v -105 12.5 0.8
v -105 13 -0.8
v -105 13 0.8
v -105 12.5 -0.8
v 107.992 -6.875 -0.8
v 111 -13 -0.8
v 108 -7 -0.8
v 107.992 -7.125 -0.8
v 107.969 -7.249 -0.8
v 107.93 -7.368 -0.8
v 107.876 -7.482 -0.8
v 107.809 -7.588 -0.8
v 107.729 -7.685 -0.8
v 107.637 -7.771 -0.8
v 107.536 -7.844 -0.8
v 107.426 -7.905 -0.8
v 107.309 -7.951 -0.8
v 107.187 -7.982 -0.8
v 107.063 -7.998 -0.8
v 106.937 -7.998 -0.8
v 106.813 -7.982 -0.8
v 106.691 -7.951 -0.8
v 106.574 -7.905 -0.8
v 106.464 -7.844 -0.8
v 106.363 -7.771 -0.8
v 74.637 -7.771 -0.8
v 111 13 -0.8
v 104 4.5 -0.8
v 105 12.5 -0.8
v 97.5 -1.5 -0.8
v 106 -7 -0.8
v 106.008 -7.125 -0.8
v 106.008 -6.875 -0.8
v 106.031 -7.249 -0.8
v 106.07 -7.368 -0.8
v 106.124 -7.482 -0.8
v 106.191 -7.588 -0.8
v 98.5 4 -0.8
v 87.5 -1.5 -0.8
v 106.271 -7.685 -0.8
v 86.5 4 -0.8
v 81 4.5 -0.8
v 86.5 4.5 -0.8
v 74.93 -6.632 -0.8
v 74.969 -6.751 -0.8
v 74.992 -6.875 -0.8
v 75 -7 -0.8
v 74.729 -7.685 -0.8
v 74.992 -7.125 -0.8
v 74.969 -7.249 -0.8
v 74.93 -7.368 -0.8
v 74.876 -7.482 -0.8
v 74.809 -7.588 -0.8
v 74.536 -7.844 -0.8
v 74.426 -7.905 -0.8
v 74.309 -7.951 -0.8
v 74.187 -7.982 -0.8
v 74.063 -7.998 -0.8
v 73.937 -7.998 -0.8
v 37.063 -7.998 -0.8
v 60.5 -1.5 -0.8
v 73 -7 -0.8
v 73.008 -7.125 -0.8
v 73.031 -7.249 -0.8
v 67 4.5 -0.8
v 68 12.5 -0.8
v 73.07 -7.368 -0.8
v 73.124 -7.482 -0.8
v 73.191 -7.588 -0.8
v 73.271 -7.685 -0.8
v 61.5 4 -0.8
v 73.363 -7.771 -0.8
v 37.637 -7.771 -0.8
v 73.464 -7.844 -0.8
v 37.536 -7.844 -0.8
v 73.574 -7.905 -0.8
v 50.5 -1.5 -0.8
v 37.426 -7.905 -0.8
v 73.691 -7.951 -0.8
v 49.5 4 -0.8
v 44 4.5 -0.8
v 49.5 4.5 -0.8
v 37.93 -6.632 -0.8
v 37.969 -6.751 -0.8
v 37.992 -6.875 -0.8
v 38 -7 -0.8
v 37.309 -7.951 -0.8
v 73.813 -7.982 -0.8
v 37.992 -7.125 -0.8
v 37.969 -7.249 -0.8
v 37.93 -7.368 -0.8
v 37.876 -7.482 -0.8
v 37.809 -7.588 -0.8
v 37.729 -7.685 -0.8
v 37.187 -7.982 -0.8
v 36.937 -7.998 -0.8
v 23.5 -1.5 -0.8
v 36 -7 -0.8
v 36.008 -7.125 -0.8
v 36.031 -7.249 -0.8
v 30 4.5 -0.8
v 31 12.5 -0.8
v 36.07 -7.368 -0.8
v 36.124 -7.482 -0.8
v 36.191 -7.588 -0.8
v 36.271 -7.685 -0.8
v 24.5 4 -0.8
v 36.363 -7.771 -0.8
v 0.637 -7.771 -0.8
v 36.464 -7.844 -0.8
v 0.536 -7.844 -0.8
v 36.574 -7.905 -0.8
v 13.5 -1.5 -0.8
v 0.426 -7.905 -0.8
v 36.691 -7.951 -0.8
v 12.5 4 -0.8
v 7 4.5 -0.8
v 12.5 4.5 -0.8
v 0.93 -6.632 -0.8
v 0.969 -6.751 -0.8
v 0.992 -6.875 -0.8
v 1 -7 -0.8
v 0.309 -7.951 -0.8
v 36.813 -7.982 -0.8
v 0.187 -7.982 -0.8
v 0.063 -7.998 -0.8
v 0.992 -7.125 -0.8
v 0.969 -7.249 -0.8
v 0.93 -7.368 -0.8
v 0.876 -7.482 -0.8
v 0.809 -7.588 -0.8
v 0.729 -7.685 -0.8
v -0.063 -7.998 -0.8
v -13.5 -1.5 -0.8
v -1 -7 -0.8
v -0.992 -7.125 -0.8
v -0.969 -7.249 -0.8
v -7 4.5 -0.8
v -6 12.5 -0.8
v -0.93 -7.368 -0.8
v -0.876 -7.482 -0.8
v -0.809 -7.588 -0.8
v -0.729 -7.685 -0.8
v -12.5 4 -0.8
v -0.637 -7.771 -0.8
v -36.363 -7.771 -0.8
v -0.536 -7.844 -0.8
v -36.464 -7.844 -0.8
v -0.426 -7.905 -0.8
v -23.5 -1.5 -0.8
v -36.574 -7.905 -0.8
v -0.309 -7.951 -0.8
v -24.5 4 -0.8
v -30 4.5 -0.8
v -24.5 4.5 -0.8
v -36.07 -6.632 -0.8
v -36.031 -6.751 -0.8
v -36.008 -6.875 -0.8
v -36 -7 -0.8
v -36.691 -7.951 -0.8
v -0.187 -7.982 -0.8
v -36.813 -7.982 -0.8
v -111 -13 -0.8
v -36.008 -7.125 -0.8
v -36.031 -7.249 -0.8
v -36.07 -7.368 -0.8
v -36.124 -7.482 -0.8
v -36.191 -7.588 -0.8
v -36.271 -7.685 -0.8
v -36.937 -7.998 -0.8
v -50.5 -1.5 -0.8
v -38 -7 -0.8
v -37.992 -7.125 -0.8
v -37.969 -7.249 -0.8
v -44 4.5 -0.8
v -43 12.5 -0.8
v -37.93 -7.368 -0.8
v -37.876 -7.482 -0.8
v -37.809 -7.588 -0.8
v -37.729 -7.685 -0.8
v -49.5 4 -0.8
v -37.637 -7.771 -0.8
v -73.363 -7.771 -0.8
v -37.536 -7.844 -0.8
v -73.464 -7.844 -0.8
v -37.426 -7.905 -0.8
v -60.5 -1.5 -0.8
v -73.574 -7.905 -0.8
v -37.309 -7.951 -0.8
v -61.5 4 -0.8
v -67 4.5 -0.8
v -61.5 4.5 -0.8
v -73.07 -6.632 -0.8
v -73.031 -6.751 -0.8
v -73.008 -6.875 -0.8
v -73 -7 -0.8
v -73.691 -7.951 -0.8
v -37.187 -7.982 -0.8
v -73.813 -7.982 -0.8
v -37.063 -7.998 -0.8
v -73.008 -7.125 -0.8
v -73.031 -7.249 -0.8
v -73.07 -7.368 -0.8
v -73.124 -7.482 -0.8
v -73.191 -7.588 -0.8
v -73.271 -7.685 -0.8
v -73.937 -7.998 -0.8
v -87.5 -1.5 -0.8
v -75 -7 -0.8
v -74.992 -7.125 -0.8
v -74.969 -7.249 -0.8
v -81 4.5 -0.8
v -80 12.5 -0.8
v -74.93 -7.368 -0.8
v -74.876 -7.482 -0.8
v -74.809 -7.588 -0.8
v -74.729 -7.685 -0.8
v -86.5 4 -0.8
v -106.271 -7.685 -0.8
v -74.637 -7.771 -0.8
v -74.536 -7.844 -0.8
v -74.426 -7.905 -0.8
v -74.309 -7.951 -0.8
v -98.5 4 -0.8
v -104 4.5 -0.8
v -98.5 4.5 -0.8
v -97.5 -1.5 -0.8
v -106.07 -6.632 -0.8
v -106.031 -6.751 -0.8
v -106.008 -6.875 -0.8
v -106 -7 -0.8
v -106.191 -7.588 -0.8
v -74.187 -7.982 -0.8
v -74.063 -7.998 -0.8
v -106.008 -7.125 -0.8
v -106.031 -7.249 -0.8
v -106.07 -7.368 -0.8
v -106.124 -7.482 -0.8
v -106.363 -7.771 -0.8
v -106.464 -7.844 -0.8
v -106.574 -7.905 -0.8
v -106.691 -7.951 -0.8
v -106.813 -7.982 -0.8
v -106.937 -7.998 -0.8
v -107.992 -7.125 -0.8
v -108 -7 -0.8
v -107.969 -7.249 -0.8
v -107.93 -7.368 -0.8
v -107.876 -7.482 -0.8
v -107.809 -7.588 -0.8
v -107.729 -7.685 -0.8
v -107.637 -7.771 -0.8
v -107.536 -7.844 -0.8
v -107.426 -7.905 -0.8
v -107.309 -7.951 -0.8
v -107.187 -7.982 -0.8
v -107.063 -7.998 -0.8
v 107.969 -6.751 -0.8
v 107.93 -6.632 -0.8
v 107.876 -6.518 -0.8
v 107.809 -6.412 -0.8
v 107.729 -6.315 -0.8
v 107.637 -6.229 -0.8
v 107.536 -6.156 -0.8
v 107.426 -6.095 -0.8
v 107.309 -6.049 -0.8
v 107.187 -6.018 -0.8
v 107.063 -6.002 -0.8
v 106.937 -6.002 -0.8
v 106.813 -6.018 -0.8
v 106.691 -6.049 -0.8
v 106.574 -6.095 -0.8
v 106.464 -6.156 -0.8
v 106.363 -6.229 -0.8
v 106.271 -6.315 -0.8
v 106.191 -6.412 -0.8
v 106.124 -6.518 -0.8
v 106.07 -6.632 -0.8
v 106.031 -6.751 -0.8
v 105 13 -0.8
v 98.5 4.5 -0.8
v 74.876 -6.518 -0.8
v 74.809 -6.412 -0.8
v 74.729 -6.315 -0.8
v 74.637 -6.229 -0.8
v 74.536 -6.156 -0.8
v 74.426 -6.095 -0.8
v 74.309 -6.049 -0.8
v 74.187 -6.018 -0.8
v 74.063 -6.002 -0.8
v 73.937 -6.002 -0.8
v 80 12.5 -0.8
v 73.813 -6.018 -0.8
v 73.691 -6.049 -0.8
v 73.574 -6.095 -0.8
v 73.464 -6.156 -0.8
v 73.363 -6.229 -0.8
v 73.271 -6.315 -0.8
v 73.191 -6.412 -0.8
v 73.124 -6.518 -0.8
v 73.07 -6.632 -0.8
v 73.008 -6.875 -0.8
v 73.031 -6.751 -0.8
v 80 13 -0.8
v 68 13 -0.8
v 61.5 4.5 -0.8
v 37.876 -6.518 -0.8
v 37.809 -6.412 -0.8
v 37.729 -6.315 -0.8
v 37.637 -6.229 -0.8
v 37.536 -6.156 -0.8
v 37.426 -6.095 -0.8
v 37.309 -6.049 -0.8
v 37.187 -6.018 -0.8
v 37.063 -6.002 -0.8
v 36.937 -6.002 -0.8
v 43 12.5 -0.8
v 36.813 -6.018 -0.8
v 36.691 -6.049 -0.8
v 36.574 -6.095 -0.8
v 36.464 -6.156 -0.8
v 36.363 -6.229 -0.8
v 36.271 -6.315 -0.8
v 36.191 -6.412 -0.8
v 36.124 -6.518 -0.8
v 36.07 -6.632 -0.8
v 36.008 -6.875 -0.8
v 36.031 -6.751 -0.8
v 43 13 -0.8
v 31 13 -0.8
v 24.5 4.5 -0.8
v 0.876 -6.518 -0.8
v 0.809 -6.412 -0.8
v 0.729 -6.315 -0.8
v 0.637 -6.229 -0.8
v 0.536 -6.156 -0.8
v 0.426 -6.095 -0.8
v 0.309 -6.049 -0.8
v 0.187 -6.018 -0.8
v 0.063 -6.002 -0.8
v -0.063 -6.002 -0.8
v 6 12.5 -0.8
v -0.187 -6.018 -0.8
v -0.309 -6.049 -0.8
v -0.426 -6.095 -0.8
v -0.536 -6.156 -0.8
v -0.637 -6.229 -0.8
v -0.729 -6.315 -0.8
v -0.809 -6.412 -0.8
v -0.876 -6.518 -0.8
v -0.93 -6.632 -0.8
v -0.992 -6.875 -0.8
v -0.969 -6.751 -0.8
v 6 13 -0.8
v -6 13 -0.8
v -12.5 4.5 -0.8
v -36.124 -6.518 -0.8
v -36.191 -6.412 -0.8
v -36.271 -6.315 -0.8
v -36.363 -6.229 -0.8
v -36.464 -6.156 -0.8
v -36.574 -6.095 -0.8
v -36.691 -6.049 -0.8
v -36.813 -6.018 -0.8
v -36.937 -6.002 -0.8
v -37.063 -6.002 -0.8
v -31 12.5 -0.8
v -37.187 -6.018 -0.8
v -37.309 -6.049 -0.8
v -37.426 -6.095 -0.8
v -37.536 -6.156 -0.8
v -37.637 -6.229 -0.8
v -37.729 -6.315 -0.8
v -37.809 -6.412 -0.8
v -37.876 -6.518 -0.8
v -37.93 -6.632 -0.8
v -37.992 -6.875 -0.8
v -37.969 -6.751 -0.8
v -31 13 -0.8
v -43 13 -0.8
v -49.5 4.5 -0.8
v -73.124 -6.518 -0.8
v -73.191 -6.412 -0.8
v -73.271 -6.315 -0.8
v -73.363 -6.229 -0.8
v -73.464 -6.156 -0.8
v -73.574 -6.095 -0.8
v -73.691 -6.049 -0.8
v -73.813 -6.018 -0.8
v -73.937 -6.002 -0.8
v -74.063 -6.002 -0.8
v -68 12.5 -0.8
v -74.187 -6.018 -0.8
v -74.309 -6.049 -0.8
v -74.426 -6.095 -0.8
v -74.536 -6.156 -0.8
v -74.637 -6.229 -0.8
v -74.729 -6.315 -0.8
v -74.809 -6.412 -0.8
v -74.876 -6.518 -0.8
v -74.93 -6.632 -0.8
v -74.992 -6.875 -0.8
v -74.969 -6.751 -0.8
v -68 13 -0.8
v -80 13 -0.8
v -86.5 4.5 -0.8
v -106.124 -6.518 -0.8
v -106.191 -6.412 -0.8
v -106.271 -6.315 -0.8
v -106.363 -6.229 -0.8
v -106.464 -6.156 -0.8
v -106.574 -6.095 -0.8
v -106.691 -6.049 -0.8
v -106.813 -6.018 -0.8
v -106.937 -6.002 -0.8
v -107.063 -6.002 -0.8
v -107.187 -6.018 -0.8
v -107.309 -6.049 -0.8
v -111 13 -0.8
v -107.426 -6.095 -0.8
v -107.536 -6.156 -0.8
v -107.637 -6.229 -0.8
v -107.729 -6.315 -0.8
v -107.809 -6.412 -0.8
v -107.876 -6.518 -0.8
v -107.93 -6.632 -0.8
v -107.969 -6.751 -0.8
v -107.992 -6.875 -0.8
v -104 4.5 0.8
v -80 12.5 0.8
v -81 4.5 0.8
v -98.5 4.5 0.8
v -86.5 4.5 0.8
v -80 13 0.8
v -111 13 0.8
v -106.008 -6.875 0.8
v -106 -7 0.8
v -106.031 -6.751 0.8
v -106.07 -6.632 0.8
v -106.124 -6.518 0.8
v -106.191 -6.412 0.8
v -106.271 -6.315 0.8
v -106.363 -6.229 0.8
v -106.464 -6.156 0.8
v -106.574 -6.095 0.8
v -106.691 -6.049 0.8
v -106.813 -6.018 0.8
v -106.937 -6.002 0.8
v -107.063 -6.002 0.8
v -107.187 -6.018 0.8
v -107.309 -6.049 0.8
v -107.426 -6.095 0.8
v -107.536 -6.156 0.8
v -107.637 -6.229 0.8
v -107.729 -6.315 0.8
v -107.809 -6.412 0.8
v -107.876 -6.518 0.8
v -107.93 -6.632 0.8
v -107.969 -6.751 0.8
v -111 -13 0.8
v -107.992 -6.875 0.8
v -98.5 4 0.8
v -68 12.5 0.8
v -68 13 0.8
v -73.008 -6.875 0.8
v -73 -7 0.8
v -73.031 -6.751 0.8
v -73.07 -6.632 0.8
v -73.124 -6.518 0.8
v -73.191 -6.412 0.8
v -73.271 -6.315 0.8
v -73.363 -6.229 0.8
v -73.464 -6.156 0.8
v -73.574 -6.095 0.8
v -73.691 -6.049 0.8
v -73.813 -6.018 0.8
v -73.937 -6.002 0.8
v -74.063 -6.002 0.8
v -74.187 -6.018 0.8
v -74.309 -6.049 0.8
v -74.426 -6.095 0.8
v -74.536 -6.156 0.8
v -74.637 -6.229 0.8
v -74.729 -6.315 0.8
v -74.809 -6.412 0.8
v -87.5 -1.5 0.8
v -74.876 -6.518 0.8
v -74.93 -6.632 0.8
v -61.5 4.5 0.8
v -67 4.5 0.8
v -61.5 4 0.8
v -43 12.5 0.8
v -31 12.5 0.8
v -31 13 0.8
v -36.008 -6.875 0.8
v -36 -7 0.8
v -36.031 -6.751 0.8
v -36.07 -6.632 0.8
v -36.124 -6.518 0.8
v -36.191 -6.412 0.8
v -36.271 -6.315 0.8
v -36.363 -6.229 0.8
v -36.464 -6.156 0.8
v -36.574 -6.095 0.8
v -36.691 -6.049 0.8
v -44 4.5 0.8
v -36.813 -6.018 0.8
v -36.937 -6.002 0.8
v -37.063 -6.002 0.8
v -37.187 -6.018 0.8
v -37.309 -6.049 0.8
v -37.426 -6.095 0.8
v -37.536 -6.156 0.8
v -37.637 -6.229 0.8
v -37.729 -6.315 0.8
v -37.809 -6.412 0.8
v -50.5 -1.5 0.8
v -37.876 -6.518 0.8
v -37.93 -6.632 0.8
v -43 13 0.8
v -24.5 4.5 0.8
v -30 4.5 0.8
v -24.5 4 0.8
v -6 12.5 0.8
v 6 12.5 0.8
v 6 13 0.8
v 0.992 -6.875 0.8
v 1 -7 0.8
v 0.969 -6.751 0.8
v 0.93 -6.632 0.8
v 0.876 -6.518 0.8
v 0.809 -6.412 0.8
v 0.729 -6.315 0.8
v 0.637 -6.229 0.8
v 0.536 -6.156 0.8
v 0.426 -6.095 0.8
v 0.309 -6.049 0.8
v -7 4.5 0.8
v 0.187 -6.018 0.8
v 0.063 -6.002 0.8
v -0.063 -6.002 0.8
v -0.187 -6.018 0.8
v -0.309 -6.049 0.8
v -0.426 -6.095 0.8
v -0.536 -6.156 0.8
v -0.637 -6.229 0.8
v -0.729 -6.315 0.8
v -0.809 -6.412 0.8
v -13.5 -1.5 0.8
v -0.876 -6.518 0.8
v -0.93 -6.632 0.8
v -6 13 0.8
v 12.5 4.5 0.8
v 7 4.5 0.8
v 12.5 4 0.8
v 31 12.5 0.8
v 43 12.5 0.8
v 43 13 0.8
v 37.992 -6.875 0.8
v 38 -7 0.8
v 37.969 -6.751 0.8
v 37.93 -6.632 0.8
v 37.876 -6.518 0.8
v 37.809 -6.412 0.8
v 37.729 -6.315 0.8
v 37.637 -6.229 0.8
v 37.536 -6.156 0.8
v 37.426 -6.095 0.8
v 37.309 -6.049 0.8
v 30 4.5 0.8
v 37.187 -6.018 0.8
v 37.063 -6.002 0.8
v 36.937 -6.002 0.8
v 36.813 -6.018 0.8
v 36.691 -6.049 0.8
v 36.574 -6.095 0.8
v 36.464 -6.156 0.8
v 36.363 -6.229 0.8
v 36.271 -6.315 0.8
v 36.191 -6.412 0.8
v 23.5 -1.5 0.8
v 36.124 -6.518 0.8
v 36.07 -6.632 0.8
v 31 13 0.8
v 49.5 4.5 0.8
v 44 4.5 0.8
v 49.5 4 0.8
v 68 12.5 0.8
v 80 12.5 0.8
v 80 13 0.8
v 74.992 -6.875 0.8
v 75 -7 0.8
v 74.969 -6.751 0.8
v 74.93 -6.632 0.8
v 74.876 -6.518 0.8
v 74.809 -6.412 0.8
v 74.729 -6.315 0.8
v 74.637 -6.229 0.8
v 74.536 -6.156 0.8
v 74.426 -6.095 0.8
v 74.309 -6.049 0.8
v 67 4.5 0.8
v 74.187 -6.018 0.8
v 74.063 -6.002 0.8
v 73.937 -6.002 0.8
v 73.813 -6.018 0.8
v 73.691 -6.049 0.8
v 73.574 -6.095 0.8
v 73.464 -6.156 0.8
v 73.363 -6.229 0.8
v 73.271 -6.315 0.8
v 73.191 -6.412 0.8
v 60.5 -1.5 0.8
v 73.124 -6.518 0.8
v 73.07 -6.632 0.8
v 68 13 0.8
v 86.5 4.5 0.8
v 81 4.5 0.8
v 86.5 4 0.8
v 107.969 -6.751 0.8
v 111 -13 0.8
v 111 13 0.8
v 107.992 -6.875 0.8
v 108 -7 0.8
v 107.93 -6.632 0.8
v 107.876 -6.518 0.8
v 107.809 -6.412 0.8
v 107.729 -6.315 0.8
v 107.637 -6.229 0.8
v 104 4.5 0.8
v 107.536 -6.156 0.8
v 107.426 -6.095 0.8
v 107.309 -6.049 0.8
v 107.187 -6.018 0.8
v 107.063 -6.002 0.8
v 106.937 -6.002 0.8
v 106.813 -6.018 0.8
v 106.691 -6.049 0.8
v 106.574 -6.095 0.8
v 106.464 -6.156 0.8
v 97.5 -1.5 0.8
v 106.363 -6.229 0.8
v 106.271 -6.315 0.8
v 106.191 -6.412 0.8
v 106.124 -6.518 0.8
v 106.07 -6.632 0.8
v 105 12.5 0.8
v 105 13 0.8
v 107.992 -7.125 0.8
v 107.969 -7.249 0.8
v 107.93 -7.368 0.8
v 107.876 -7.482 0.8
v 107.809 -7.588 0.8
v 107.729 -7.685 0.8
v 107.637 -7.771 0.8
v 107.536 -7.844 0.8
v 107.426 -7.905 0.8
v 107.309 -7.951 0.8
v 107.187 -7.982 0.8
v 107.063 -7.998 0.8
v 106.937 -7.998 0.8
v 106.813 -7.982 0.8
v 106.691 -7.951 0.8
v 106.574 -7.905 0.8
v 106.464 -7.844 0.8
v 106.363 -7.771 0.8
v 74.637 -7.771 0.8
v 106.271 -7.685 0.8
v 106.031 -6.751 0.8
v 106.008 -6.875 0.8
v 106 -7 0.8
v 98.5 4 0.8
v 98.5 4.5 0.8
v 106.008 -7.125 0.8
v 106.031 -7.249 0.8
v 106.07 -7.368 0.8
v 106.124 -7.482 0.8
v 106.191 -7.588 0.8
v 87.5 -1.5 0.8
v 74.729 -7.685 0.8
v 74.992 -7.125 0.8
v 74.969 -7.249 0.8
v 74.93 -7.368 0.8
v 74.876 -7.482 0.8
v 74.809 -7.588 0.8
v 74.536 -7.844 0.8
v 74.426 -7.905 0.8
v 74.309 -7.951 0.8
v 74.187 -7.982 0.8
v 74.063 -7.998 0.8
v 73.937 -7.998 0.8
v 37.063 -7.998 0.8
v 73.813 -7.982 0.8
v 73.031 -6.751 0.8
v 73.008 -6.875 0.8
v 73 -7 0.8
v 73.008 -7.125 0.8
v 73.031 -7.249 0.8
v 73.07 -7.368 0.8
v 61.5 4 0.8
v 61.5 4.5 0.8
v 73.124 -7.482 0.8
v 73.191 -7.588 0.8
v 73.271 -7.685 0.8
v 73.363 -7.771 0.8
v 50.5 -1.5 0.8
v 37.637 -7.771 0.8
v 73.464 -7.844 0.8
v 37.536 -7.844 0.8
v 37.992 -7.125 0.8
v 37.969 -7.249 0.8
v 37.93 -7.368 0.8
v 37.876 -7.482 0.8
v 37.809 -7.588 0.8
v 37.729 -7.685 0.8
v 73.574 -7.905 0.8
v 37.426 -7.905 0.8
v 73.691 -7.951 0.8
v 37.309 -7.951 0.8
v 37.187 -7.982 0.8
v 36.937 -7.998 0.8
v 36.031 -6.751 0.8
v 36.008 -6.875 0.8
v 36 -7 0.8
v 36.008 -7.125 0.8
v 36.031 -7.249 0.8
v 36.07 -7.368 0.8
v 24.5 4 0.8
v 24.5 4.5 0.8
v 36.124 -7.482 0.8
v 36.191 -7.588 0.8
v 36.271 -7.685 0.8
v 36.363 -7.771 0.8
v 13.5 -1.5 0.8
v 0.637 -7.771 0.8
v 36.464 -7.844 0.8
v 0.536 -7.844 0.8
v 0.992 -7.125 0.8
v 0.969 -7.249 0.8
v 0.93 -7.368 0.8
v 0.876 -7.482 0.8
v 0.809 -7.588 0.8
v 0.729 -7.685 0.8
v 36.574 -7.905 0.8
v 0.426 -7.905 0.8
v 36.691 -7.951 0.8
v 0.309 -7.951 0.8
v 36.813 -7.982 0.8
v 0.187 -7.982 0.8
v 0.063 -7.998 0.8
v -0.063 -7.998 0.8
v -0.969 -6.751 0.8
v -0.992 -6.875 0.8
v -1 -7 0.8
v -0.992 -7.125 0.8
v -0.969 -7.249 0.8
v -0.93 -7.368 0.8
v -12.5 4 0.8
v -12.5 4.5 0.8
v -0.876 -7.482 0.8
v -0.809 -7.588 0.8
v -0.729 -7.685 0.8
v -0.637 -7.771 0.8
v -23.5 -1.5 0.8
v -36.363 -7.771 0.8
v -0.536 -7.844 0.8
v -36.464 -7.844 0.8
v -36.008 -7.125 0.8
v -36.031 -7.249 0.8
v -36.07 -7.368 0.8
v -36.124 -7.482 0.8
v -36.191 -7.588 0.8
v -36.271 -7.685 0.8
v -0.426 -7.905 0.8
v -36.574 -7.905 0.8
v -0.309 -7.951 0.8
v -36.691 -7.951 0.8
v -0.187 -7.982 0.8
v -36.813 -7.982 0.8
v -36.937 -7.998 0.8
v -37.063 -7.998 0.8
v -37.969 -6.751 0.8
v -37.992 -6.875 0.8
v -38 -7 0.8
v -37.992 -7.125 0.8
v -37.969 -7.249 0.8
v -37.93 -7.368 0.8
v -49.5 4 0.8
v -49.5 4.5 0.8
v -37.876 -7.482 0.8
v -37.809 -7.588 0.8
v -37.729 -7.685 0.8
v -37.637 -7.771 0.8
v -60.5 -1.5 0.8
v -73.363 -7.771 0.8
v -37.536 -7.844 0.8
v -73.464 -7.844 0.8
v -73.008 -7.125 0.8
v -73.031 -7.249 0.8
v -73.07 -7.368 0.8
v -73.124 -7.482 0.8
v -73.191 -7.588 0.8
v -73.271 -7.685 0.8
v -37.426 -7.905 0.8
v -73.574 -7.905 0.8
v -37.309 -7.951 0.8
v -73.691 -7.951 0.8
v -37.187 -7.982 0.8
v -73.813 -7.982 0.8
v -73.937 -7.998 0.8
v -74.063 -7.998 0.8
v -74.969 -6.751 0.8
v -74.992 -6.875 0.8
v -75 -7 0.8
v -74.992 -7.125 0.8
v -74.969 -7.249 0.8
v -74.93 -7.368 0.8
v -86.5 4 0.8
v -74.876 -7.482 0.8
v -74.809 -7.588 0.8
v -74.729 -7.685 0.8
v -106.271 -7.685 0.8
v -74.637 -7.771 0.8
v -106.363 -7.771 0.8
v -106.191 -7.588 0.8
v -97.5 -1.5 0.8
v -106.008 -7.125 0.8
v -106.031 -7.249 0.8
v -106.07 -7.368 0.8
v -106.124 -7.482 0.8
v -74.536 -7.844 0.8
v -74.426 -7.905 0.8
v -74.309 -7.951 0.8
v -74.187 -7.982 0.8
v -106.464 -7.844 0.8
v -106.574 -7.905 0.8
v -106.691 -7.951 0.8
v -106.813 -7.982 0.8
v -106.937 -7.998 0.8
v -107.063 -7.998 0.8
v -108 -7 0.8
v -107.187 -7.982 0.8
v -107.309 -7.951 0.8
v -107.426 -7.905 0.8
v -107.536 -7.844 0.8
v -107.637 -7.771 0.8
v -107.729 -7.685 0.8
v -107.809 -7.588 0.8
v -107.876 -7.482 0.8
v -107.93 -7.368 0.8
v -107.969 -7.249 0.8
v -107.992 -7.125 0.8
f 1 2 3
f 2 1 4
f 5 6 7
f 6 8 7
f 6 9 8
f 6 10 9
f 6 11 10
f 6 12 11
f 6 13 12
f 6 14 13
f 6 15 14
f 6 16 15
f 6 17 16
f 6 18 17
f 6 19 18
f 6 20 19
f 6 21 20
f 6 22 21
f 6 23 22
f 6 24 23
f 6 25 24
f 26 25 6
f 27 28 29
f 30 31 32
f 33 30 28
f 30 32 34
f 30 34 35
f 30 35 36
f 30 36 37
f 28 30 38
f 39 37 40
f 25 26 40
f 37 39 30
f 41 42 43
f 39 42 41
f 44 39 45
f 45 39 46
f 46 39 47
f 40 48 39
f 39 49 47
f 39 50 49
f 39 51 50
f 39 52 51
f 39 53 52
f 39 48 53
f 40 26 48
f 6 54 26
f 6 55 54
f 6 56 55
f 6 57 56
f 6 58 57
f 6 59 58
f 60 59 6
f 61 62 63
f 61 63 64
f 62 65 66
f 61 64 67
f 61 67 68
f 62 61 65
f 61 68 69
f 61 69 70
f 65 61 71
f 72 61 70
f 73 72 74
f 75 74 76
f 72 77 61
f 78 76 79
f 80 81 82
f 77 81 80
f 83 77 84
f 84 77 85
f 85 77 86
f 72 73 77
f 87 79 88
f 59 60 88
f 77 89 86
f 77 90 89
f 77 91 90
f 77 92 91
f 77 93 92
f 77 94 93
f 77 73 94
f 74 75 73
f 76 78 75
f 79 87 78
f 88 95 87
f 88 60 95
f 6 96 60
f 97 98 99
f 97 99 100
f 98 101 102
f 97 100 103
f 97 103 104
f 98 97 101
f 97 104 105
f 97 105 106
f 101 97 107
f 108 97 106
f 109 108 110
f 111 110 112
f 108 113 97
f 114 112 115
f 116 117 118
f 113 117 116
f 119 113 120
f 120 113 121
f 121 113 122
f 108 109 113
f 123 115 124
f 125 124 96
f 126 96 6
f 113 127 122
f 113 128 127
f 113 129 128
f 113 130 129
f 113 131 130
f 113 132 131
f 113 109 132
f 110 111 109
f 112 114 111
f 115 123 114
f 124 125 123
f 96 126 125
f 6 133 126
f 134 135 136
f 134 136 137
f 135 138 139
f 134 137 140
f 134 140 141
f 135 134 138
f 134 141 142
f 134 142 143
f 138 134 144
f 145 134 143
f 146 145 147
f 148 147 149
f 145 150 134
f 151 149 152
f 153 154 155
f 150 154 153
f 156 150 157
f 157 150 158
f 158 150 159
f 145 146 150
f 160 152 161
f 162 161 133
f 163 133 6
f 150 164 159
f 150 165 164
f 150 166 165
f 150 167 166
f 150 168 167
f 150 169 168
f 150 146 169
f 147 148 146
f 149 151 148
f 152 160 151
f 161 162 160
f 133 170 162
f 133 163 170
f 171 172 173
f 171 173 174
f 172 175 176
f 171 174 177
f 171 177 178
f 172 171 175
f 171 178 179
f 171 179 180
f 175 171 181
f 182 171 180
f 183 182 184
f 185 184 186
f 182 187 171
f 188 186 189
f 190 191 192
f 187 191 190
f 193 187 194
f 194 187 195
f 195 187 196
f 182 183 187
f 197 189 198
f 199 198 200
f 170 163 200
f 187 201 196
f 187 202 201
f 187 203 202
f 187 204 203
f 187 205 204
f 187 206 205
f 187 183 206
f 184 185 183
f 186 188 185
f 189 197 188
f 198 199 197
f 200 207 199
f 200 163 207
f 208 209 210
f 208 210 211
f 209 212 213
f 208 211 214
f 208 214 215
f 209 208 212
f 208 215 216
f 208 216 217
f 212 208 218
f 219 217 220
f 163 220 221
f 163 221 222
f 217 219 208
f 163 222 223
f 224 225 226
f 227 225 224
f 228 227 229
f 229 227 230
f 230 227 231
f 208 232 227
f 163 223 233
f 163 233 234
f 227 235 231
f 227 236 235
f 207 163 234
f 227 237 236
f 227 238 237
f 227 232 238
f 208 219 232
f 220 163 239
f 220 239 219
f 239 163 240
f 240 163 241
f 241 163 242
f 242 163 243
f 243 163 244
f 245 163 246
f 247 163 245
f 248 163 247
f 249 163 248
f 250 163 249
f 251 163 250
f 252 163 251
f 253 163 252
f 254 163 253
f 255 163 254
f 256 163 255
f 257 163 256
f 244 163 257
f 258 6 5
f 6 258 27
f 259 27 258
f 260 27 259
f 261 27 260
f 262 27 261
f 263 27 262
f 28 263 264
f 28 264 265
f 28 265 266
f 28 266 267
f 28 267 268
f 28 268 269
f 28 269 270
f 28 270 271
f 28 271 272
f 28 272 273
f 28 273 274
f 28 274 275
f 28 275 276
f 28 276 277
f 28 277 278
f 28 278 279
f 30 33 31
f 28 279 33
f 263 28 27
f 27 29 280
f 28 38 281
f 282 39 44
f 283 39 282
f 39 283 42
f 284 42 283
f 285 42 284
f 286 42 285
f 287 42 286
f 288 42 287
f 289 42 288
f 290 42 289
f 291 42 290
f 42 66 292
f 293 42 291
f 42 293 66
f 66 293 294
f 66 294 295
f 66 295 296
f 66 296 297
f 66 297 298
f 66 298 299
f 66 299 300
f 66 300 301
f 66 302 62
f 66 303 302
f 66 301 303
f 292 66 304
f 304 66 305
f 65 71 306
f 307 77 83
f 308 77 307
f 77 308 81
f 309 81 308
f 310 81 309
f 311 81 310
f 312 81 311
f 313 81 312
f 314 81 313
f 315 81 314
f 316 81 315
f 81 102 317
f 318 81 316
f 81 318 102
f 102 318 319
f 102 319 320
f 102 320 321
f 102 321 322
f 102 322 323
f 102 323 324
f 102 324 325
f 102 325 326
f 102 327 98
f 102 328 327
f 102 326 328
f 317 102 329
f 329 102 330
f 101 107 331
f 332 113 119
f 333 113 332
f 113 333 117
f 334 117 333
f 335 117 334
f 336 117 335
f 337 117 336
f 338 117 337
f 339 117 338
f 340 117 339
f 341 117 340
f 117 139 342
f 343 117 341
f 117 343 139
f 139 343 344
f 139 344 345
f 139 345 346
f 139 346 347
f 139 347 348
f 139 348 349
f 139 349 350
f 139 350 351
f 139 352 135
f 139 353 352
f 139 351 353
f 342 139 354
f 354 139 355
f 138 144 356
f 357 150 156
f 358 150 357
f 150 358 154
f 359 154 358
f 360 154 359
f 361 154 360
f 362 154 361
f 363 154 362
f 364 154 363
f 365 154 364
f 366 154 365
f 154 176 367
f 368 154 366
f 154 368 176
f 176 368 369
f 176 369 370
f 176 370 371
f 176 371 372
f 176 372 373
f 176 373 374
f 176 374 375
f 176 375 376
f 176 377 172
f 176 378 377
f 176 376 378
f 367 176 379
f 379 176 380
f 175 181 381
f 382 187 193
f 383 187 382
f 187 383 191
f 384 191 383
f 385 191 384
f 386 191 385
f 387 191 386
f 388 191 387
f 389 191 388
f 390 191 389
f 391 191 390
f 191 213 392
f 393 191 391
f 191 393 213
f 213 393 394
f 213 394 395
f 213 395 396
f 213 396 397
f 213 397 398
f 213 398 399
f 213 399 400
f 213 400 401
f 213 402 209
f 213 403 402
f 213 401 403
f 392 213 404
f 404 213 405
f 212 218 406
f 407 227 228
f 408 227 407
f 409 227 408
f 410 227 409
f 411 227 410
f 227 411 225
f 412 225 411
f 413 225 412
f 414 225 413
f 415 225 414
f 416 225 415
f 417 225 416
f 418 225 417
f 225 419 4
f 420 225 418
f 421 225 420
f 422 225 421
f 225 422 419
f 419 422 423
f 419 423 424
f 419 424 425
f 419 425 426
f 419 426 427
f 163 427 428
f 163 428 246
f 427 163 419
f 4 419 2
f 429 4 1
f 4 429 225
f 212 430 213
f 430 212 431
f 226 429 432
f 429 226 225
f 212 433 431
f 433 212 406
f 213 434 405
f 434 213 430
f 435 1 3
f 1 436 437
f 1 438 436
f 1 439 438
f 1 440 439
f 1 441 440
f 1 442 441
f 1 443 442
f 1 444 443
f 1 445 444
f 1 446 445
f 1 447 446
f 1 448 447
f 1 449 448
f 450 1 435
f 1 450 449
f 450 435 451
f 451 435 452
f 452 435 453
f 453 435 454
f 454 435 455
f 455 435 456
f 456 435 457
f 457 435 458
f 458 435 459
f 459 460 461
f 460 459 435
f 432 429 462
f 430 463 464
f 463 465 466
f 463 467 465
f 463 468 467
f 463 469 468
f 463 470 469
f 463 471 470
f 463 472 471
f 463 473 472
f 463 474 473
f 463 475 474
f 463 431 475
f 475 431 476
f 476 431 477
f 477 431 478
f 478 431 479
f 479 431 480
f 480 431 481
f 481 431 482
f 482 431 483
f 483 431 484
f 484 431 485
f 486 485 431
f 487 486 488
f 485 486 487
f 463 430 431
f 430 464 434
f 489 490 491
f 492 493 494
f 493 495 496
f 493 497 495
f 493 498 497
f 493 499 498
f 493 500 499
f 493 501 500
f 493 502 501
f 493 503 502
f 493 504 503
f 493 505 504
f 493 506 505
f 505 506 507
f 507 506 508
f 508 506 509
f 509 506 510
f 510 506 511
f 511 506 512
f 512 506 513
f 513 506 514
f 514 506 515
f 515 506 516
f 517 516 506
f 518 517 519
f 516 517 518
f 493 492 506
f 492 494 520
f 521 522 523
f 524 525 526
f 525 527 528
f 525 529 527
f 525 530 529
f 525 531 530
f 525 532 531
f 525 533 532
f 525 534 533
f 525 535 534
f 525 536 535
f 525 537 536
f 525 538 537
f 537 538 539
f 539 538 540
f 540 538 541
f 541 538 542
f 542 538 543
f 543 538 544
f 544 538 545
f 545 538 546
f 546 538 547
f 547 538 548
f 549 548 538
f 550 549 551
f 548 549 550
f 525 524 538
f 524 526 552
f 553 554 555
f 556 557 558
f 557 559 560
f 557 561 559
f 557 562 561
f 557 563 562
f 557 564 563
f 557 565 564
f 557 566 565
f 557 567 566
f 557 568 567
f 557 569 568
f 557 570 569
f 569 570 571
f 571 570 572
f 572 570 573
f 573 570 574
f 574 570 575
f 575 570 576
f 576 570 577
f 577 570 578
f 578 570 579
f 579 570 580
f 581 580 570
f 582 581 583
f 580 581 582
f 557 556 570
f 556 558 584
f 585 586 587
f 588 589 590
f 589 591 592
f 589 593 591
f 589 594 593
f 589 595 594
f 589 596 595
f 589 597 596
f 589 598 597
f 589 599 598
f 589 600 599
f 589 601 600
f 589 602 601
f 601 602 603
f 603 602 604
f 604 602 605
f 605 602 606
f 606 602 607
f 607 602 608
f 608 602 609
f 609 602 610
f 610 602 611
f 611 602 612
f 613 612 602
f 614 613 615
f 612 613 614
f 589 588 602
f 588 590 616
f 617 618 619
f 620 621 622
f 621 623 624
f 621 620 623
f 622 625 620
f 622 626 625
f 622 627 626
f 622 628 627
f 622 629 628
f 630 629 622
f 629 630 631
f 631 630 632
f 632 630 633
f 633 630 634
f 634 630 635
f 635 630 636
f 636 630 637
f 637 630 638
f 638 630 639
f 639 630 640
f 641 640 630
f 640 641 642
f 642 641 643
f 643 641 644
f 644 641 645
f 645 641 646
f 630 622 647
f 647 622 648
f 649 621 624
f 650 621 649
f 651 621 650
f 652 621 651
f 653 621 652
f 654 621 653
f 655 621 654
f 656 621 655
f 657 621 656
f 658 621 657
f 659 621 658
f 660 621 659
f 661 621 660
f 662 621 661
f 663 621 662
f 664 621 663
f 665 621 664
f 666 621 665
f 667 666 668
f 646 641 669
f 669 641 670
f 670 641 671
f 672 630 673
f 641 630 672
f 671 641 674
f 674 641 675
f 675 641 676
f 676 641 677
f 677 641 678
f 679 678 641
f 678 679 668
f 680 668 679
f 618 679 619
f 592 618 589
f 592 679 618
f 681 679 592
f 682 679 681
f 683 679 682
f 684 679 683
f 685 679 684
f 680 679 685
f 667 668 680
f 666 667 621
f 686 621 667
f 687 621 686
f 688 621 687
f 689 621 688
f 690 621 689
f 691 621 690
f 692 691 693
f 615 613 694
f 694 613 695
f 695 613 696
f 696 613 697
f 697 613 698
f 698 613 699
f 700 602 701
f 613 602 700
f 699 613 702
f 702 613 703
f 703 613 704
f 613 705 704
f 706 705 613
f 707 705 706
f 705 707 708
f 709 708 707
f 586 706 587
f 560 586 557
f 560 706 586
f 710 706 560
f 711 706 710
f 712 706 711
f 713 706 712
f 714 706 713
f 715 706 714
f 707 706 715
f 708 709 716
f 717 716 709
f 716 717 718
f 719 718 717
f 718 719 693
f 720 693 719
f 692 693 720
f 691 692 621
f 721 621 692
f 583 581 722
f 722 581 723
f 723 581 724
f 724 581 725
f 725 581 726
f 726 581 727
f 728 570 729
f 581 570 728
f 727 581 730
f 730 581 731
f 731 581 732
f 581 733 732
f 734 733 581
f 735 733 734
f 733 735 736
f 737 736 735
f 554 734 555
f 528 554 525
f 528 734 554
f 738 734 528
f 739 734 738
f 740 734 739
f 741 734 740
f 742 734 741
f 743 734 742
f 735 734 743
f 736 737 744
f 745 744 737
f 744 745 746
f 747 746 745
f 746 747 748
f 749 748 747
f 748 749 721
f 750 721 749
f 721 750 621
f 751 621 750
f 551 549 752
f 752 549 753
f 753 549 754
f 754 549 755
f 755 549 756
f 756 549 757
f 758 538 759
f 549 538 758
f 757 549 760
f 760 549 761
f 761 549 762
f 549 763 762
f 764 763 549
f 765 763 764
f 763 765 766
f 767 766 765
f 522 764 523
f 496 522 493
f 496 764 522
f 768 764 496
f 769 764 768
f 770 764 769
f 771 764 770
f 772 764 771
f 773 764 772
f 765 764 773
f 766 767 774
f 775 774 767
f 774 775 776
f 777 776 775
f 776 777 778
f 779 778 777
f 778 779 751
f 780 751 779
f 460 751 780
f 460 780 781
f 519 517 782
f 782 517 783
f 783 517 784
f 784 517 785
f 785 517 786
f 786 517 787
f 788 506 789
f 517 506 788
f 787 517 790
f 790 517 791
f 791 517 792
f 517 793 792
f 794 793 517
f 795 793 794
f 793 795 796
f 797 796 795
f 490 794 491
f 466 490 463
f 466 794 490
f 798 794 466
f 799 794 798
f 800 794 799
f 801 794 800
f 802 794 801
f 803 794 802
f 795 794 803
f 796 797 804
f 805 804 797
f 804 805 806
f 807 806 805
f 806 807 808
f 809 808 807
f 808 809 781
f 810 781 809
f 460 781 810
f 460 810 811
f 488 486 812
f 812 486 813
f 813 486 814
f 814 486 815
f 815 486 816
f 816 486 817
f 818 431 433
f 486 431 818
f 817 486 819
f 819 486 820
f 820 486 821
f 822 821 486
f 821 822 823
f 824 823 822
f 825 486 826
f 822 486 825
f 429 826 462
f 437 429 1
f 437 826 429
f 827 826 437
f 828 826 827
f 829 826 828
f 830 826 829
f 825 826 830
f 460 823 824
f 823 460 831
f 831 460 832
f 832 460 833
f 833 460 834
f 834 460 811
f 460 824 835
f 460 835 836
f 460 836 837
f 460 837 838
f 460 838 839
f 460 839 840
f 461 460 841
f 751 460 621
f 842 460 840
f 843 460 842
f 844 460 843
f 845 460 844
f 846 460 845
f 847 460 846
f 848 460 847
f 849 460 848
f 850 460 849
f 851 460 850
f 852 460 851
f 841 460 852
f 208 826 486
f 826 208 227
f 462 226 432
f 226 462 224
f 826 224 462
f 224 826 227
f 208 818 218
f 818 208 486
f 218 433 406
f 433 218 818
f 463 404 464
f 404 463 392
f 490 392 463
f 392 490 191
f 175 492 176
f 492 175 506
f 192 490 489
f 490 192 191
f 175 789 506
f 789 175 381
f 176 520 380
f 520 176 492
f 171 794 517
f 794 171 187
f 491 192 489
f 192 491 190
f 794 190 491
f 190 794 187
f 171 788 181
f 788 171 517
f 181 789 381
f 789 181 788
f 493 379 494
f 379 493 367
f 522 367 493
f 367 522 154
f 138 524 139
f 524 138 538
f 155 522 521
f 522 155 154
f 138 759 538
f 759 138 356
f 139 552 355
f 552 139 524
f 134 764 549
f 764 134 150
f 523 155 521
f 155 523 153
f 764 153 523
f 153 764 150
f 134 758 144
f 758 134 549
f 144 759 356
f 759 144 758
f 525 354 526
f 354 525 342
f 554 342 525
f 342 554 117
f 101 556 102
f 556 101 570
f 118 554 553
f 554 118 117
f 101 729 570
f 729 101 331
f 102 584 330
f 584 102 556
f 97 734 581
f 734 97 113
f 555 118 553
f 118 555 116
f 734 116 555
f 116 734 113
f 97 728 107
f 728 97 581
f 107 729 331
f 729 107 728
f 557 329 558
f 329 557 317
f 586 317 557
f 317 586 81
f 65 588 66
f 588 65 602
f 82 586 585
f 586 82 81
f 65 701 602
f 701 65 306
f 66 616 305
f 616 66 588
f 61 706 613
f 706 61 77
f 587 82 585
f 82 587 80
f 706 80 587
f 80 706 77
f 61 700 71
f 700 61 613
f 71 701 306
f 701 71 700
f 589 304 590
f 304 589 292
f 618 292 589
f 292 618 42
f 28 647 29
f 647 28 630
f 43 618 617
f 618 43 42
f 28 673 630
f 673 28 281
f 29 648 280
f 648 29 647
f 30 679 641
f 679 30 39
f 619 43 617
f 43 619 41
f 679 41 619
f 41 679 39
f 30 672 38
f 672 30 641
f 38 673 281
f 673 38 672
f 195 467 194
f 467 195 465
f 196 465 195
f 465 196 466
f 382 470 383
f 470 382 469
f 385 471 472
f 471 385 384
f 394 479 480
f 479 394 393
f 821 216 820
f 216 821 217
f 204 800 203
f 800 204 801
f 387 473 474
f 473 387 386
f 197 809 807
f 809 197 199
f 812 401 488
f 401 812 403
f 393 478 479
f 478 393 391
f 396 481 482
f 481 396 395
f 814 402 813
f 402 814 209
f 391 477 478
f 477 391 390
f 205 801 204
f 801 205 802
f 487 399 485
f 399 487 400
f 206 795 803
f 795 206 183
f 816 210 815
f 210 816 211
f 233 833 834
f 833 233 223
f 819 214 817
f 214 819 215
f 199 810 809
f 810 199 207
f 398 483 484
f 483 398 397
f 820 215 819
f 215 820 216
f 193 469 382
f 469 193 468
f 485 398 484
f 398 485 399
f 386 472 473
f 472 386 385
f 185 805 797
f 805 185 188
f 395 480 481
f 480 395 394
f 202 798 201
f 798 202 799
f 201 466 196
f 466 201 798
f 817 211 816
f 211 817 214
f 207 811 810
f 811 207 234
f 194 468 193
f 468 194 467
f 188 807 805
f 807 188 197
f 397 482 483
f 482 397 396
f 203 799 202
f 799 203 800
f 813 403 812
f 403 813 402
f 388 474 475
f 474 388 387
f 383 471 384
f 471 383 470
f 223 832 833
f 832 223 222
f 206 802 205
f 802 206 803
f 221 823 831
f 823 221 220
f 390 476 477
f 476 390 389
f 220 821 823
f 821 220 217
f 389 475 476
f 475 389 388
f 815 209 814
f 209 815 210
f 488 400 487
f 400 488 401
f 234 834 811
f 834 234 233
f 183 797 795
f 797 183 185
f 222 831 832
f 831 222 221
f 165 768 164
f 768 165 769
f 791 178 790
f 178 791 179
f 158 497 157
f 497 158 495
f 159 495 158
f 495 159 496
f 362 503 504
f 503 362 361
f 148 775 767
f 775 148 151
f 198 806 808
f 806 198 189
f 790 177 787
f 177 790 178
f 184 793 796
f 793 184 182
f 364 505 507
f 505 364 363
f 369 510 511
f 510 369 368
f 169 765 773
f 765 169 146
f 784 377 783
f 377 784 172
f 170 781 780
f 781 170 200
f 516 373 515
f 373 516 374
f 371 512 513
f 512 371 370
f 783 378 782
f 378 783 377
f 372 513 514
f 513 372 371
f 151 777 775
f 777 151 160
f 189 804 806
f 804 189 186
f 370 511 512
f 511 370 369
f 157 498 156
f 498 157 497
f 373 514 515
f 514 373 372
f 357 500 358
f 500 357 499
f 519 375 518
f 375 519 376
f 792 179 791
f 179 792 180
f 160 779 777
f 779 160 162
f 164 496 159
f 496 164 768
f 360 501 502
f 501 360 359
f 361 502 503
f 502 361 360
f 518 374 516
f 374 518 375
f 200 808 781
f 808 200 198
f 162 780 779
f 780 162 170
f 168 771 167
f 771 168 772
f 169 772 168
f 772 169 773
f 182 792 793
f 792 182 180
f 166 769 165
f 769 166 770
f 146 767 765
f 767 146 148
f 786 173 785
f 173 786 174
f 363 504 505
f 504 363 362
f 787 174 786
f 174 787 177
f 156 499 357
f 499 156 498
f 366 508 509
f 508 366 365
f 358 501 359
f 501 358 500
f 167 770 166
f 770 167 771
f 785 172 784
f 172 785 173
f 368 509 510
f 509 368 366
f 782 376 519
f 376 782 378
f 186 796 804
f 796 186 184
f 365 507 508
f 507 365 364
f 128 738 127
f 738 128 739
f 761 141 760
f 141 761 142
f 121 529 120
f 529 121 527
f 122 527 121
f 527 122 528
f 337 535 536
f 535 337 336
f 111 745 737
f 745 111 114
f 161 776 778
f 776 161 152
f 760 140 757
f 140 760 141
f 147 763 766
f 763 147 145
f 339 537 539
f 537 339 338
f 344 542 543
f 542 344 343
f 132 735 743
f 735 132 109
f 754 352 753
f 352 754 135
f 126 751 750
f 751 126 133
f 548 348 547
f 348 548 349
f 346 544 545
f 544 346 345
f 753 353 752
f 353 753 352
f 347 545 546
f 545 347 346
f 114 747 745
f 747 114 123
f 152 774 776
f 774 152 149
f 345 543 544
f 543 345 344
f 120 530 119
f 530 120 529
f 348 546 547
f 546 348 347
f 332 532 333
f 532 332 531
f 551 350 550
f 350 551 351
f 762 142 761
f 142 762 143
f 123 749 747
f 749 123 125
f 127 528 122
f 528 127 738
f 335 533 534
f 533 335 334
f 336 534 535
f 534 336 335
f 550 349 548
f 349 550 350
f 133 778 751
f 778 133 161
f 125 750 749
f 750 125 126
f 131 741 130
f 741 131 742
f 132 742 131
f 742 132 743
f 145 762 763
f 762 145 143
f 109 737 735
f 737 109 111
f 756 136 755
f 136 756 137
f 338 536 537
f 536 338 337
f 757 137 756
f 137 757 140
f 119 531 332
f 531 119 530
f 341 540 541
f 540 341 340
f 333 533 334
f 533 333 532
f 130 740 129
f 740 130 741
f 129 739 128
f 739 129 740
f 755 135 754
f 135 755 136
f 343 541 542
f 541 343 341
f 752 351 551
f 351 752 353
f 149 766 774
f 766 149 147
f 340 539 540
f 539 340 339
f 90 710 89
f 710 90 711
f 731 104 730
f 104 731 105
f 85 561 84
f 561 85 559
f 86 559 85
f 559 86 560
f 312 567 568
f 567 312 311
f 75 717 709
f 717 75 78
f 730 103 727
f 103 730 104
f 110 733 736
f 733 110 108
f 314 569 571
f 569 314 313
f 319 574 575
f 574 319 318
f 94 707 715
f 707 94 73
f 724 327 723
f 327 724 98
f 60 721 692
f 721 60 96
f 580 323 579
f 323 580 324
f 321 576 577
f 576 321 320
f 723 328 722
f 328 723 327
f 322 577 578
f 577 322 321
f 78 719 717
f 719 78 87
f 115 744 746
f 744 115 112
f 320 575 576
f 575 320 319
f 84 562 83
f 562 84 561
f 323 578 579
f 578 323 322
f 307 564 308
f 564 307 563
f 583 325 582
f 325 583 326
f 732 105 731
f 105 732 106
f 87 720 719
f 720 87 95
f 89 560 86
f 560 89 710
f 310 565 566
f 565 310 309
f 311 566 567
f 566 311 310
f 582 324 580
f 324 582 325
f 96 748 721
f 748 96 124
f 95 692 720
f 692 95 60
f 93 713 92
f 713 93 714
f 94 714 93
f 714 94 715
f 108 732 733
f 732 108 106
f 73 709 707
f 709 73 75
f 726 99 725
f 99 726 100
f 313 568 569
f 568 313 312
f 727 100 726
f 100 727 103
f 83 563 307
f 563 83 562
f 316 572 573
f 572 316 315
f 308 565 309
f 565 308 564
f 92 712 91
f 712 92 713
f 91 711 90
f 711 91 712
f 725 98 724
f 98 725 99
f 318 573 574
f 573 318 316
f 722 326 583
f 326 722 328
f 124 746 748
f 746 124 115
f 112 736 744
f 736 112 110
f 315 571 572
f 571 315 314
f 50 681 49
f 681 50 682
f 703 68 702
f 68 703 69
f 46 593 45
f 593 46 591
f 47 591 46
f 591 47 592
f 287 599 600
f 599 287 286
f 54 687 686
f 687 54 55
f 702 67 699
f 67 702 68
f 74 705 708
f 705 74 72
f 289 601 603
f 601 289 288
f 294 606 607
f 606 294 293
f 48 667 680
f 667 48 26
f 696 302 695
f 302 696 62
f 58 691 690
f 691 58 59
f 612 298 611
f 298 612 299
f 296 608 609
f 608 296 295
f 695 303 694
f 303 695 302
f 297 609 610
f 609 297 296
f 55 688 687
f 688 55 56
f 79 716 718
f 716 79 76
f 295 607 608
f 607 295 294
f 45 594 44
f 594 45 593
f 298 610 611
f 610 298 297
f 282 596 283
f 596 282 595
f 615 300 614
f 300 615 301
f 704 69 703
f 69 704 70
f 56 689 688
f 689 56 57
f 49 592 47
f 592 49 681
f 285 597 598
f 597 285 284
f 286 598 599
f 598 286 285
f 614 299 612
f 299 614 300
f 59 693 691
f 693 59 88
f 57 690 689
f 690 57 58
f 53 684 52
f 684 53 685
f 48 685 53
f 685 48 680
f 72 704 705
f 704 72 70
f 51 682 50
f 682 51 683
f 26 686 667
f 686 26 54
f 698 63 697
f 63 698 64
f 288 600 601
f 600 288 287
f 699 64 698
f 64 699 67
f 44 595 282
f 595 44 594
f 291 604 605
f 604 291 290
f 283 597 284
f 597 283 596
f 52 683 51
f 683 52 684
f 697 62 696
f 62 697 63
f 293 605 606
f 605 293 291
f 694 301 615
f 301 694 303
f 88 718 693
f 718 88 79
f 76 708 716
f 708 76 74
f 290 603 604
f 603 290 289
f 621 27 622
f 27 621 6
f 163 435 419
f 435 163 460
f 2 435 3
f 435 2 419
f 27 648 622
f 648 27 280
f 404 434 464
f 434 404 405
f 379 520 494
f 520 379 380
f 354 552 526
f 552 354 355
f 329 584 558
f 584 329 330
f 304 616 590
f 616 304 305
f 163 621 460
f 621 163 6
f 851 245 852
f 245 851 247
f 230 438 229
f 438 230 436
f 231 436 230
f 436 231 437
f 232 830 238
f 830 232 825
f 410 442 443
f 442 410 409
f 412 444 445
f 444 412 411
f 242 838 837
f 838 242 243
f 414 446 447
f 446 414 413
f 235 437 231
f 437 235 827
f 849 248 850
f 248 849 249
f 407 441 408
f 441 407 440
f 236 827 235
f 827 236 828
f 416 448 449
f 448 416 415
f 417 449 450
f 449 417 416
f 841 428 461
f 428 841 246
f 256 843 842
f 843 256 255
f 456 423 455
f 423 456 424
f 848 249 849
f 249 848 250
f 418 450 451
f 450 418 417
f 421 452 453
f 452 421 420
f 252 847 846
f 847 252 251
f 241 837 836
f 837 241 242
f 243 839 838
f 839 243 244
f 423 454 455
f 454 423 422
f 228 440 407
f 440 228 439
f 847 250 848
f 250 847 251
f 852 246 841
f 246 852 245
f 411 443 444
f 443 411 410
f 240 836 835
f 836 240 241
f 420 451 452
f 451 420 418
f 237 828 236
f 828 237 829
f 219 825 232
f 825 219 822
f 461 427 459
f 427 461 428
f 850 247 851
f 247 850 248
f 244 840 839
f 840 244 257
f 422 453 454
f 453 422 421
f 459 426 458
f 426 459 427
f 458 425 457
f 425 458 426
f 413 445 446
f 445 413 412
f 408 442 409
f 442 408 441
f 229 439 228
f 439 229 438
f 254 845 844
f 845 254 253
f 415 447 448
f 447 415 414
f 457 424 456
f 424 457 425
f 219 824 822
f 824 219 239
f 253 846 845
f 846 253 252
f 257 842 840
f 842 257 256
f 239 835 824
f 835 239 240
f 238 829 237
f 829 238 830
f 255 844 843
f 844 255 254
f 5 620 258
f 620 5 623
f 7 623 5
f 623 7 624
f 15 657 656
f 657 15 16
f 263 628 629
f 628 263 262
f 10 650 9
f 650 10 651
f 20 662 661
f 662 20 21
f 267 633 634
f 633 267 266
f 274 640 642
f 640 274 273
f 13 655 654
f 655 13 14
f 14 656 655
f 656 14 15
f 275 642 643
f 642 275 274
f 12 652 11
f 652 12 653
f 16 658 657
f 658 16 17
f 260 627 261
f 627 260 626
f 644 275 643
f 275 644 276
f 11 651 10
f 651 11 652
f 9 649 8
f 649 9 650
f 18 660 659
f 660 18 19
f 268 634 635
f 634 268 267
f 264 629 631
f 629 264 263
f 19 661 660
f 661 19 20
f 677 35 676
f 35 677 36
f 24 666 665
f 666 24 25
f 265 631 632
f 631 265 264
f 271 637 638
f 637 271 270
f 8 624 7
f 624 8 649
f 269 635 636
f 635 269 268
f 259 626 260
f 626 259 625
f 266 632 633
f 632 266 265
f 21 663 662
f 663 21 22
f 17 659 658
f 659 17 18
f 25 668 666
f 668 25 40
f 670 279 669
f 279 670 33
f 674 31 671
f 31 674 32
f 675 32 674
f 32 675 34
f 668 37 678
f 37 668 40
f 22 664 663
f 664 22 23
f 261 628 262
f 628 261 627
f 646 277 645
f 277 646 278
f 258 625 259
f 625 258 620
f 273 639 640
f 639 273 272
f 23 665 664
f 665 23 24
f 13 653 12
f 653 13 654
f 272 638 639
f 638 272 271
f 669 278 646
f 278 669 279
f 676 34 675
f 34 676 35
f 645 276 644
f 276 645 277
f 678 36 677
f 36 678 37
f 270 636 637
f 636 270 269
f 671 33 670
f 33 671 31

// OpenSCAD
/* [Main Dimensions] */

// Hart-to-hart Distance between frames (35 - 38 are most used variations)
distance = 37;
// Frame size width (better set slightly larger than the actual width)
framesize = 23;
// Number of Frames
frames = 6;
// Thickness of spacer
Thickness = 1.6;
// Size of mount holes
holesize = 2;

/* [Hidden] */
leng = (frames)*distance;
wid = 26;
offset = 7;

echo("length=",leng);

module hole()
{
    hull()
    {
        translate([0,4,0])
            cube([framesize+2,1,Thickness],center=true);
        translate([0,-4,0])
            cube([framesize,1,Thickness],center=true);
    }
    translate([0,-4.5-3,0])
        cube([10,6,Thickness],center=true);
    hull()
    {
        translate([0,-4.5,0])
            cube([12,1,Thickness],center=true);
        translate([0,-4.5-5.5,0])
            cube([10,1,Thickness],center=true);
    }
}

difference()
{
    cube([leng,wid,Thickness],center=true);
    translate([-leng/2+distance/2,0,0])
    for(i=[0:frames-1])
    {
        translate([distance*i,wid/2-4,0])
            hole();
    }
    translate([-leng/2+distance,-offset,0])
    for(i=[0:frames-2])
    {
        translate([distance*i,0,0])
            cylinder(r=holesize/2,h=Thickness,$fn=50,center=true);
    }
    translate([-leng/2+holesize*2,-offset,0])
        cylinder(r=holesize/2,h=Thickness,$fn=50,center=true);
    translate([leng/2-holesize*2,-offset,0])
        cylinder(r=holesize/2,h=Thickness,$fn=50,center=true);
}
